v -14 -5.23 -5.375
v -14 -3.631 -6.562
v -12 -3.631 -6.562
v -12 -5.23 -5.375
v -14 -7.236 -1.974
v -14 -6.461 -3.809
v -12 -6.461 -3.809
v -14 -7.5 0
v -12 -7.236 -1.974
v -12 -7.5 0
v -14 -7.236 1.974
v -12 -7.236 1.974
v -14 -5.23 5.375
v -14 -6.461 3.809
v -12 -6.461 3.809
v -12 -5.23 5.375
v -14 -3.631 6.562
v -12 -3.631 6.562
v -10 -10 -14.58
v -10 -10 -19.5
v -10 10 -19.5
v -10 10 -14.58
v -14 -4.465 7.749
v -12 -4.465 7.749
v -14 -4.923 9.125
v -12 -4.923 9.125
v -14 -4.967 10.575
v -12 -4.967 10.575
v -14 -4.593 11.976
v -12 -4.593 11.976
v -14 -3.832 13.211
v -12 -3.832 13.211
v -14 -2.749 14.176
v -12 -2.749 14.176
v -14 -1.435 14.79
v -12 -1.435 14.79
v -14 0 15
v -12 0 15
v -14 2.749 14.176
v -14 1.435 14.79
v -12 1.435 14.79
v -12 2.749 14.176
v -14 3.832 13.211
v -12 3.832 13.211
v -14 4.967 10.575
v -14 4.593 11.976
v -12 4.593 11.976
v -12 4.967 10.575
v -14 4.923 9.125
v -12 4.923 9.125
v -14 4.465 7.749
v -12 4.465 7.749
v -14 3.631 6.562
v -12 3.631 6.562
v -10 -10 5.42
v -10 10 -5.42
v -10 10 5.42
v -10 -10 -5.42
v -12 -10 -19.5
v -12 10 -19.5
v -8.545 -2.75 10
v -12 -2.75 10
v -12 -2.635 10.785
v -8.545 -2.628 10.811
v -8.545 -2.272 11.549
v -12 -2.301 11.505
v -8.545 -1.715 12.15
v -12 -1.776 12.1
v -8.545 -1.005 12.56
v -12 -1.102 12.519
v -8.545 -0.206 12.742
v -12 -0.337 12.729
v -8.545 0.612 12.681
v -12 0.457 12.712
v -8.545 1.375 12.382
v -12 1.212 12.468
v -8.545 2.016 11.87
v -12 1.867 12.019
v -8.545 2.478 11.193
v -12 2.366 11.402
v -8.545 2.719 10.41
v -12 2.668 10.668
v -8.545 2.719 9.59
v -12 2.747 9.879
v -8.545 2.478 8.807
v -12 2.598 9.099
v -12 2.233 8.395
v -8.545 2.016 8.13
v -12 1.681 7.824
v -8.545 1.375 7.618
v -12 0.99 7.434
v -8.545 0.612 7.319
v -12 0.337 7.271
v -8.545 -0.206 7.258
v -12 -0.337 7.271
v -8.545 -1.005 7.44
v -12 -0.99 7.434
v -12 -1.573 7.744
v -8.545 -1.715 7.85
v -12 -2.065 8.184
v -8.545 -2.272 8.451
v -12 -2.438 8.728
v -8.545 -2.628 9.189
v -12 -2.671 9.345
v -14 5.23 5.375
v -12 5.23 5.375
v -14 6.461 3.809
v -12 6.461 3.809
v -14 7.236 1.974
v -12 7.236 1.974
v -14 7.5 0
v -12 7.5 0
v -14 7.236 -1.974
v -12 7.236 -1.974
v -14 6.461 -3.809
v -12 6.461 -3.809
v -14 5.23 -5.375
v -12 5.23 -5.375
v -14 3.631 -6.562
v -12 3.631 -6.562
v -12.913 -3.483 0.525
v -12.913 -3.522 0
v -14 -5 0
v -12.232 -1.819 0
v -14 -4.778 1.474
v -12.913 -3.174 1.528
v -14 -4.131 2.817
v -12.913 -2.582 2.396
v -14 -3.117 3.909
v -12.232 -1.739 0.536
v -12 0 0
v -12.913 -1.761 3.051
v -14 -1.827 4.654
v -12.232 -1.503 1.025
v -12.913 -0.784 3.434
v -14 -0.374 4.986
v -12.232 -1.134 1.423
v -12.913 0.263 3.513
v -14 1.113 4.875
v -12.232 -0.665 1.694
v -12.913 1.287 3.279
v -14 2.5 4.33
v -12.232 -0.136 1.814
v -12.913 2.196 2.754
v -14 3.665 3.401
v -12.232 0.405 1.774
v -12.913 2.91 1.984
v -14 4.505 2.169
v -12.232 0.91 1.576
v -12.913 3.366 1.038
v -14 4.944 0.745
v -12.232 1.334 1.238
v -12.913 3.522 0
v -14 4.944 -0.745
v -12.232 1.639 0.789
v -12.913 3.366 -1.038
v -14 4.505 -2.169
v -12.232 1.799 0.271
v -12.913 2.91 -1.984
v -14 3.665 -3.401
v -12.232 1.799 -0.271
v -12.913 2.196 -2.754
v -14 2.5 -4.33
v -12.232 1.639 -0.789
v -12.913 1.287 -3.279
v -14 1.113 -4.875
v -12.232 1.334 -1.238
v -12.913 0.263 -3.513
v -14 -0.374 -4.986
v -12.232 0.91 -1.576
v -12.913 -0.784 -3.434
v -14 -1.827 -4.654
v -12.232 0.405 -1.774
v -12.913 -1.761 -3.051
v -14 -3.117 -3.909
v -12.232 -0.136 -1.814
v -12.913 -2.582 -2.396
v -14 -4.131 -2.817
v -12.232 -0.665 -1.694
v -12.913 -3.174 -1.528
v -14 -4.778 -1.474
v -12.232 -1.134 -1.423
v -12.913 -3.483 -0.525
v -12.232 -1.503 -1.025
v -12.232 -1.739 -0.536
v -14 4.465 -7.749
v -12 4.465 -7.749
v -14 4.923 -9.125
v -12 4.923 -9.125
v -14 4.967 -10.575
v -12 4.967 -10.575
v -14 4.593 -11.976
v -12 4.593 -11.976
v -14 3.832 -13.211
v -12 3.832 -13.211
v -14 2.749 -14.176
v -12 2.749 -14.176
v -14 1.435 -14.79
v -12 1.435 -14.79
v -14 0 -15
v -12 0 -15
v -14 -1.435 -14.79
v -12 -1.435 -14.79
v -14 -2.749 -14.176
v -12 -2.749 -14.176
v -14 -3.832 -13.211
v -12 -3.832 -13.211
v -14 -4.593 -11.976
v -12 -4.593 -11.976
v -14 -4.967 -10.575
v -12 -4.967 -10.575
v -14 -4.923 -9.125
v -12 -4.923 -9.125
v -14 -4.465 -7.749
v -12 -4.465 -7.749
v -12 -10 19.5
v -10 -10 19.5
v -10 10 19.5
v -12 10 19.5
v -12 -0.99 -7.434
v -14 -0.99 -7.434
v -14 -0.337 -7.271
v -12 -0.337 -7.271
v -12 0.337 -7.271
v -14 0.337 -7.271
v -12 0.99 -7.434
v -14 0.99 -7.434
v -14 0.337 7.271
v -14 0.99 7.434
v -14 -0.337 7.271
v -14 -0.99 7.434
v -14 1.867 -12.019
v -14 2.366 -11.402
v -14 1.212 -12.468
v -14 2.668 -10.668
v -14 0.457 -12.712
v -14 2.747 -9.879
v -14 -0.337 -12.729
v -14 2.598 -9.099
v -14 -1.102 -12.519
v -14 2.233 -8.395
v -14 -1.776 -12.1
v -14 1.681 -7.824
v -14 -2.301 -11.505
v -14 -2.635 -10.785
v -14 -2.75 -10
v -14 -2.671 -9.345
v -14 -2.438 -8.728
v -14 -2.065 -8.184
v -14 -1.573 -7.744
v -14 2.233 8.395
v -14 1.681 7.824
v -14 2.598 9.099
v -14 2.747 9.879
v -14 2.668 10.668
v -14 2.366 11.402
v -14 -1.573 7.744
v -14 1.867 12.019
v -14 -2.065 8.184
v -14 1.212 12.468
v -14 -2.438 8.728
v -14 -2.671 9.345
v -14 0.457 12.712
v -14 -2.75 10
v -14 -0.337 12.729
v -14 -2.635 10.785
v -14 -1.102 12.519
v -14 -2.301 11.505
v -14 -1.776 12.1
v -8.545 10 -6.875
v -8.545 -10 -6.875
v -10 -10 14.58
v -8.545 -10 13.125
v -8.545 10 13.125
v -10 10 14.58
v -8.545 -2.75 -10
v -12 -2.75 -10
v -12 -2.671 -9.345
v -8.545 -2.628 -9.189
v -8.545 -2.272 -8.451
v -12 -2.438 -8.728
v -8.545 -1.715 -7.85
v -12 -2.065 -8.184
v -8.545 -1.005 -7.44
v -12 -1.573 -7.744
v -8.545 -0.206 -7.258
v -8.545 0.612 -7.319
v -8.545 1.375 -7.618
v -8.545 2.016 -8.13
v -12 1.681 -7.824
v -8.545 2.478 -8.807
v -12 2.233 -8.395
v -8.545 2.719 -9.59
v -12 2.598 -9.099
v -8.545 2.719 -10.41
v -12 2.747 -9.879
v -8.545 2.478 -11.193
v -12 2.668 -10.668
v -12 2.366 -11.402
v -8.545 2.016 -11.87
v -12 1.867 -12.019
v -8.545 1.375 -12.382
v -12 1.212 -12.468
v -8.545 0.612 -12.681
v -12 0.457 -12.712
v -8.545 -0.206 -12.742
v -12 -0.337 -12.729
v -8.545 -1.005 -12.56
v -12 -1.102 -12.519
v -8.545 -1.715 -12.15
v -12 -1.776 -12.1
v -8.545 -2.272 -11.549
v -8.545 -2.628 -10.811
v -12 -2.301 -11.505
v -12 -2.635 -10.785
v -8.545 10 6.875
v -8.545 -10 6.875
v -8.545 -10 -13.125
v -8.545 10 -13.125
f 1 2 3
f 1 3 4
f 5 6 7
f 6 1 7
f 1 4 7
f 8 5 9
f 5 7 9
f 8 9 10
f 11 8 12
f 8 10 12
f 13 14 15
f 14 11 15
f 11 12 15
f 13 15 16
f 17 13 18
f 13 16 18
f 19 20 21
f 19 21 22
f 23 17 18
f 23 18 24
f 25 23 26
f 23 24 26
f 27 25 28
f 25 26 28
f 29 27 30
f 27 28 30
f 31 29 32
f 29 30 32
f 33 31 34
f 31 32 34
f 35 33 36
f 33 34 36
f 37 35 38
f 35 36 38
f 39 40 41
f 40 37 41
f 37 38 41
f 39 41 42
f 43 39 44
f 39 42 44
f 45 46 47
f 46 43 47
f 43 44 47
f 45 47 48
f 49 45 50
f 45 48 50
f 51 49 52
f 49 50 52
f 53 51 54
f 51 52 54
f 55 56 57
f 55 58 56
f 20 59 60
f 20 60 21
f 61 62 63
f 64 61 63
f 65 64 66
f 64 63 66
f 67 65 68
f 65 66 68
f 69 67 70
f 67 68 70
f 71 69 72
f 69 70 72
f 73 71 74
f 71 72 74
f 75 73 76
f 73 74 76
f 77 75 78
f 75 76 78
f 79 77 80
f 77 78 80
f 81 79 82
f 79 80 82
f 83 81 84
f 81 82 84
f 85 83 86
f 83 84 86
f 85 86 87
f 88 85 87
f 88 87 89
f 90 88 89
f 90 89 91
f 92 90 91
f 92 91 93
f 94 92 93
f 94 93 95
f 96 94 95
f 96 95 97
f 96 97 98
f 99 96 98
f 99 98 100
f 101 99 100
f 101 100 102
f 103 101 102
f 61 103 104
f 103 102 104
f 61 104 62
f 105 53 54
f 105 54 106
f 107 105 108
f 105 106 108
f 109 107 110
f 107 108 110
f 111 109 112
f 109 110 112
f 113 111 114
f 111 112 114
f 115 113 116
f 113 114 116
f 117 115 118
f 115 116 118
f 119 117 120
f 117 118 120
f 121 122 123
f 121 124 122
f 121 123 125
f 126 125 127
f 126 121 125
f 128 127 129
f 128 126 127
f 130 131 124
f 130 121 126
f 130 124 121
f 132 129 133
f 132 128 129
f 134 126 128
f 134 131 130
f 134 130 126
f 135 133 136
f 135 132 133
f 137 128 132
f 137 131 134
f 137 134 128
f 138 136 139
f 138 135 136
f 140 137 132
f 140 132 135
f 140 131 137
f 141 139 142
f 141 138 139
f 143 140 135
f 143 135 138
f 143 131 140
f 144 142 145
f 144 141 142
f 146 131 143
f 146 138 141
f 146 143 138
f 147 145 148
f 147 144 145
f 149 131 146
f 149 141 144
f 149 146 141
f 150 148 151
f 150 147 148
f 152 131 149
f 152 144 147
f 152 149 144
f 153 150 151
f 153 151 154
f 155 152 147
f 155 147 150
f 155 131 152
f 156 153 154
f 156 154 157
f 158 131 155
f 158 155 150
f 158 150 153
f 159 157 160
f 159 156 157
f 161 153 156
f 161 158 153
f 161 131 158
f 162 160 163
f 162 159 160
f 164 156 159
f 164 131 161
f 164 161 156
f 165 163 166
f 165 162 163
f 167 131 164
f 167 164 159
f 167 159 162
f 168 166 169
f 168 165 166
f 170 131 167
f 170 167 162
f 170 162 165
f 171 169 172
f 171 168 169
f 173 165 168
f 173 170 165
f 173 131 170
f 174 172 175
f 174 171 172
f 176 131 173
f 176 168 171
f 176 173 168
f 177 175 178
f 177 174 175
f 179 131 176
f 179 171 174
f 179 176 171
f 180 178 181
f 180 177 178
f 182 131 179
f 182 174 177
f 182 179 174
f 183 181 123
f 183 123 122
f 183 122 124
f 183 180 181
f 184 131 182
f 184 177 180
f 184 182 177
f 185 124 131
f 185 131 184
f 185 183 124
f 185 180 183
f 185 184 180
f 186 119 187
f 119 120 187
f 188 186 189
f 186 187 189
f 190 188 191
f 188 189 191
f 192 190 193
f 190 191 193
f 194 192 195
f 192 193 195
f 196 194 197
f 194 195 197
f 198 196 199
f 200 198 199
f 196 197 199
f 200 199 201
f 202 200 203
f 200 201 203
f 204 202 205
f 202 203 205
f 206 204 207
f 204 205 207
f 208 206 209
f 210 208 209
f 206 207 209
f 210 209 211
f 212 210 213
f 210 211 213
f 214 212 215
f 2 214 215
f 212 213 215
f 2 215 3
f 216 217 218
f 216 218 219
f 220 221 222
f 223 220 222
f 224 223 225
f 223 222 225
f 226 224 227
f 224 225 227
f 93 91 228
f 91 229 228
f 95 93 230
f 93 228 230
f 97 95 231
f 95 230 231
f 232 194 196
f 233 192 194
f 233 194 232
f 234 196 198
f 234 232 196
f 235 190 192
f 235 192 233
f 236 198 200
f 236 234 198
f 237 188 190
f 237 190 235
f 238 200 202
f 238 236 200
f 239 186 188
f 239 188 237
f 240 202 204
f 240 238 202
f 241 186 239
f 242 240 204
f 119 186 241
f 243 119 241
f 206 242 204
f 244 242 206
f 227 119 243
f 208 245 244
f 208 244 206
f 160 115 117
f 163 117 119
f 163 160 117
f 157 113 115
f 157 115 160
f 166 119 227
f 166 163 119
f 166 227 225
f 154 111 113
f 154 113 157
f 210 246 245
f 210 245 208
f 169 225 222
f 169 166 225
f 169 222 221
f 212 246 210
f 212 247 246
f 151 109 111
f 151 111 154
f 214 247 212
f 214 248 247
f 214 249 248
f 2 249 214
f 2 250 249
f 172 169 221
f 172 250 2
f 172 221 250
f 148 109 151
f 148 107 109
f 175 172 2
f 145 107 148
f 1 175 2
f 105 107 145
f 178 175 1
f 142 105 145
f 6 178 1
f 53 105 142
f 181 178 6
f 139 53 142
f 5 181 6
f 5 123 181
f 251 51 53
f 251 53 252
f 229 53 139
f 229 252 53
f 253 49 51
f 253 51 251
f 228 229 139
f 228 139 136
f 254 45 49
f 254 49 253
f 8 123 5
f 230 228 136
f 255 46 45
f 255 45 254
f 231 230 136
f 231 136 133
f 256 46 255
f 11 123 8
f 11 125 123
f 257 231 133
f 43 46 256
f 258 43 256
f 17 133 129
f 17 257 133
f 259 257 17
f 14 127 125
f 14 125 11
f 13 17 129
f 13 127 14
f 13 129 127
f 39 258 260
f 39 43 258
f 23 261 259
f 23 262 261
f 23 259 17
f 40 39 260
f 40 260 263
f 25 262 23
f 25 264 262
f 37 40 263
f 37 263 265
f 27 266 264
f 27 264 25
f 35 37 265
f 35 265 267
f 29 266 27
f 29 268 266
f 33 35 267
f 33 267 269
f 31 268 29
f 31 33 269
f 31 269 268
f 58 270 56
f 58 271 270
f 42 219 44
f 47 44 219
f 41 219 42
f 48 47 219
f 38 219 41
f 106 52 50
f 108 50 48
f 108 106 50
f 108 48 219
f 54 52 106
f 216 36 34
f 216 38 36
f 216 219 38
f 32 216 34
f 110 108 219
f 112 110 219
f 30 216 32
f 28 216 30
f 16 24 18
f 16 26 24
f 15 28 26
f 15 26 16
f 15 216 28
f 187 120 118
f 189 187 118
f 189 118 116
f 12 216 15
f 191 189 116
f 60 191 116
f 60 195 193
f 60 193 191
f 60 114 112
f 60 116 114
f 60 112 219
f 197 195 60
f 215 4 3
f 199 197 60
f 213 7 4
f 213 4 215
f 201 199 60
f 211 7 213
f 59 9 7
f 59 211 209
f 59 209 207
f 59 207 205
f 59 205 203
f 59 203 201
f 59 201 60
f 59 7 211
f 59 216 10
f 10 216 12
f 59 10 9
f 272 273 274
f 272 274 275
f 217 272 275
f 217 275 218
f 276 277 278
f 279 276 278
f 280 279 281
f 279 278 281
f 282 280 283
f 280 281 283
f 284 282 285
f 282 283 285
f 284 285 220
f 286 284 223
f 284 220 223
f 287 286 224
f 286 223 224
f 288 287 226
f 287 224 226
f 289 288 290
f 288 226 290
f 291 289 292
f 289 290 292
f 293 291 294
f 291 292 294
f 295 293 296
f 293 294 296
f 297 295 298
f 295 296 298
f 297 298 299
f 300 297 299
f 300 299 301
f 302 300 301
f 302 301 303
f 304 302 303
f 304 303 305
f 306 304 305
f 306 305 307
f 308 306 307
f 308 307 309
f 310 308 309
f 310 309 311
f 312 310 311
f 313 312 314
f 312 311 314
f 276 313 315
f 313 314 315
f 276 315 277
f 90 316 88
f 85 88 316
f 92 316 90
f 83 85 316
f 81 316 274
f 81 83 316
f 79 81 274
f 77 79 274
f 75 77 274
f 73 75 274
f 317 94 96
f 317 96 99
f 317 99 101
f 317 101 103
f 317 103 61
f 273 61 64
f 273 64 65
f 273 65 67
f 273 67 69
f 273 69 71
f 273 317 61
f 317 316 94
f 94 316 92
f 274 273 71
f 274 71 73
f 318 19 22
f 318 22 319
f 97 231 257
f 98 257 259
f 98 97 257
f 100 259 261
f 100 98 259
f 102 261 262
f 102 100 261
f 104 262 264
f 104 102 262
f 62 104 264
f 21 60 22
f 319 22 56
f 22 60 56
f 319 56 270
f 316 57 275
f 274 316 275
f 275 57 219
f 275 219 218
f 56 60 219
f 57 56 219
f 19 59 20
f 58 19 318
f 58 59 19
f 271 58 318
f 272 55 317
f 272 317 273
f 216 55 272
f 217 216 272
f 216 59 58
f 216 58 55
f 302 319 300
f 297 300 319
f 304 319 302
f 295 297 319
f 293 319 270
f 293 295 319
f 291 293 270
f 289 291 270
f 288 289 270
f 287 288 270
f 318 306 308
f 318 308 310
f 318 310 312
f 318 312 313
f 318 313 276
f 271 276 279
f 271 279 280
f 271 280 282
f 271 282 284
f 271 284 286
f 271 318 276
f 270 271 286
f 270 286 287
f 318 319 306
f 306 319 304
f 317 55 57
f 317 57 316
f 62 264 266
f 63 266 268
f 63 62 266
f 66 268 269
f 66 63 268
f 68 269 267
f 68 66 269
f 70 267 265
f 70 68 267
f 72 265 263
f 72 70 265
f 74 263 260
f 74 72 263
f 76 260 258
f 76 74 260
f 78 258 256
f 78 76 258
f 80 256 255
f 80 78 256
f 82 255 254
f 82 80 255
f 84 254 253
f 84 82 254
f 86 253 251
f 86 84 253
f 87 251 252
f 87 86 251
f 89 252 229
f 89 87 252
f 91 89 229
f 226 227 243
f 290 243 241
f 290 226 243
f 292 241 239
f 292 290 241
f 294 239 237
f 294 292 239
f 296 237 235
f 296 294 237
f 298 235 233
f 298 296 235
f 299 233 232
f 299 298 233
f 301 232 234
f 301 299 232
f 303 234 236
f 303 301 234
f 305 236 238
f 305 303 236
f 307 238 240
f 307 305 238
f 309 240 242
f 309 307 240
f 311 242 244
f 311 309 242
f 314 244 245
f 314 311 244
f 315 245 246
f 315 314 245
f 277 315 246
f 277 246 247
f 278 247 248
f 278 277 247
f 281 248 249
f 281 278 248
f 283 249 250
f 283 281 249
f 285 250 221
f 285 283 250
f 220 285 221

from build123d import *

# Parameters (mm, degrees)
F2_DEPTH  = 10
F3_R      = 7.5
F4_DEPTH  = 2
F8_D      = 5.5
F8_DEPTH  = 3.456
F9_R      = 2.75
F10_DEPTH = 25
F11_R     = 5
F11_R_2   = 2.75
F12_DEPTH = 2


with BuildPart() as f2:
    # F1 (on Front) → F2 (new body, symmetric)
    with BuildSketch(Plane.XZ):
        Polygon((-10, -5.42), (-10, 5.42), (-8.545, 6.875), (-8.545, 13.125), (-10, 14.58), (-10, 19.5), (-12, 19.5), (-12, -19.5), (-10, -19.5), (-10, -14.58), (-8.545, -13.125), (-8.545, -6.875), align=None)
    extrude(amount=F2_DEPTH, both=True)

    # F3 (on face) → F4 (join)
    with BuildSketch(Plane(origin=(-12, 0, 0), x_dir=(0, -1, 0), z_dir=(-1, 0, 0))):
        Circle(F3_R)
    extrude(amount=F4_DEPTH)

    # F5 (on Top) → F6 (revolve, cut)
    with BuildSketch(Plane.XY):
        with BuildLine():
            Line((-14, 0), (-14, -5))
            ThreePointArc((-14, -5), (-12.5185439911, -2.6925824036), (-12, 0))
            Line((-12, 0), (-14, 0))
        make_face()
    revolve(axis=Axis((-13, 0, 0), (-1, 0, 0)), mode=Mode.SUBTRACT)

    # F8 (through all, one way)
    with BuildSketch(Plane(origin=(-12, 0, 0), x_dir=(0, -1, 0), z_dir=(-1, 0, 0))):
        with Locations((0, 10), (0, -10)):
            Circle(F8_D / 2)
    extrude(amount=-F8_DEPTH, mode=Mode.SUBTRACT)

    # F9 (on face) → F10 (cut)
    with BuildSketch(Plane.YZ.offset(-8.545)):
        with Locations((0, 10)):
            Circle(F9_R)
        with Locations((0, -10)):
            Circle(F9_R)
    extrude(amount=-F10_DEPTH, mode=Mode.SUBTRACT)

    # F11 (on face) → F12 (join, through all)
    with BuildSketch(Plane(origin=(-12, 0, 0), x_dir=(0, -1, 0), z_dir=(-1, 0, 0))):
        with Locations((0, 10)):
            Circle(F11_R)
        with Locations((0, 10)):
            Circle(F11_R_2, mode=Mode.SUBTRACT)
        with Locations((0, -10)):
            Circle(F11_R)
        with Locations((0, -10)):
            Circle(F11_R_2, mode=Mode.SUBTRACT)
    extrude(amount=F12_DEPTH)


solid = f2.part
